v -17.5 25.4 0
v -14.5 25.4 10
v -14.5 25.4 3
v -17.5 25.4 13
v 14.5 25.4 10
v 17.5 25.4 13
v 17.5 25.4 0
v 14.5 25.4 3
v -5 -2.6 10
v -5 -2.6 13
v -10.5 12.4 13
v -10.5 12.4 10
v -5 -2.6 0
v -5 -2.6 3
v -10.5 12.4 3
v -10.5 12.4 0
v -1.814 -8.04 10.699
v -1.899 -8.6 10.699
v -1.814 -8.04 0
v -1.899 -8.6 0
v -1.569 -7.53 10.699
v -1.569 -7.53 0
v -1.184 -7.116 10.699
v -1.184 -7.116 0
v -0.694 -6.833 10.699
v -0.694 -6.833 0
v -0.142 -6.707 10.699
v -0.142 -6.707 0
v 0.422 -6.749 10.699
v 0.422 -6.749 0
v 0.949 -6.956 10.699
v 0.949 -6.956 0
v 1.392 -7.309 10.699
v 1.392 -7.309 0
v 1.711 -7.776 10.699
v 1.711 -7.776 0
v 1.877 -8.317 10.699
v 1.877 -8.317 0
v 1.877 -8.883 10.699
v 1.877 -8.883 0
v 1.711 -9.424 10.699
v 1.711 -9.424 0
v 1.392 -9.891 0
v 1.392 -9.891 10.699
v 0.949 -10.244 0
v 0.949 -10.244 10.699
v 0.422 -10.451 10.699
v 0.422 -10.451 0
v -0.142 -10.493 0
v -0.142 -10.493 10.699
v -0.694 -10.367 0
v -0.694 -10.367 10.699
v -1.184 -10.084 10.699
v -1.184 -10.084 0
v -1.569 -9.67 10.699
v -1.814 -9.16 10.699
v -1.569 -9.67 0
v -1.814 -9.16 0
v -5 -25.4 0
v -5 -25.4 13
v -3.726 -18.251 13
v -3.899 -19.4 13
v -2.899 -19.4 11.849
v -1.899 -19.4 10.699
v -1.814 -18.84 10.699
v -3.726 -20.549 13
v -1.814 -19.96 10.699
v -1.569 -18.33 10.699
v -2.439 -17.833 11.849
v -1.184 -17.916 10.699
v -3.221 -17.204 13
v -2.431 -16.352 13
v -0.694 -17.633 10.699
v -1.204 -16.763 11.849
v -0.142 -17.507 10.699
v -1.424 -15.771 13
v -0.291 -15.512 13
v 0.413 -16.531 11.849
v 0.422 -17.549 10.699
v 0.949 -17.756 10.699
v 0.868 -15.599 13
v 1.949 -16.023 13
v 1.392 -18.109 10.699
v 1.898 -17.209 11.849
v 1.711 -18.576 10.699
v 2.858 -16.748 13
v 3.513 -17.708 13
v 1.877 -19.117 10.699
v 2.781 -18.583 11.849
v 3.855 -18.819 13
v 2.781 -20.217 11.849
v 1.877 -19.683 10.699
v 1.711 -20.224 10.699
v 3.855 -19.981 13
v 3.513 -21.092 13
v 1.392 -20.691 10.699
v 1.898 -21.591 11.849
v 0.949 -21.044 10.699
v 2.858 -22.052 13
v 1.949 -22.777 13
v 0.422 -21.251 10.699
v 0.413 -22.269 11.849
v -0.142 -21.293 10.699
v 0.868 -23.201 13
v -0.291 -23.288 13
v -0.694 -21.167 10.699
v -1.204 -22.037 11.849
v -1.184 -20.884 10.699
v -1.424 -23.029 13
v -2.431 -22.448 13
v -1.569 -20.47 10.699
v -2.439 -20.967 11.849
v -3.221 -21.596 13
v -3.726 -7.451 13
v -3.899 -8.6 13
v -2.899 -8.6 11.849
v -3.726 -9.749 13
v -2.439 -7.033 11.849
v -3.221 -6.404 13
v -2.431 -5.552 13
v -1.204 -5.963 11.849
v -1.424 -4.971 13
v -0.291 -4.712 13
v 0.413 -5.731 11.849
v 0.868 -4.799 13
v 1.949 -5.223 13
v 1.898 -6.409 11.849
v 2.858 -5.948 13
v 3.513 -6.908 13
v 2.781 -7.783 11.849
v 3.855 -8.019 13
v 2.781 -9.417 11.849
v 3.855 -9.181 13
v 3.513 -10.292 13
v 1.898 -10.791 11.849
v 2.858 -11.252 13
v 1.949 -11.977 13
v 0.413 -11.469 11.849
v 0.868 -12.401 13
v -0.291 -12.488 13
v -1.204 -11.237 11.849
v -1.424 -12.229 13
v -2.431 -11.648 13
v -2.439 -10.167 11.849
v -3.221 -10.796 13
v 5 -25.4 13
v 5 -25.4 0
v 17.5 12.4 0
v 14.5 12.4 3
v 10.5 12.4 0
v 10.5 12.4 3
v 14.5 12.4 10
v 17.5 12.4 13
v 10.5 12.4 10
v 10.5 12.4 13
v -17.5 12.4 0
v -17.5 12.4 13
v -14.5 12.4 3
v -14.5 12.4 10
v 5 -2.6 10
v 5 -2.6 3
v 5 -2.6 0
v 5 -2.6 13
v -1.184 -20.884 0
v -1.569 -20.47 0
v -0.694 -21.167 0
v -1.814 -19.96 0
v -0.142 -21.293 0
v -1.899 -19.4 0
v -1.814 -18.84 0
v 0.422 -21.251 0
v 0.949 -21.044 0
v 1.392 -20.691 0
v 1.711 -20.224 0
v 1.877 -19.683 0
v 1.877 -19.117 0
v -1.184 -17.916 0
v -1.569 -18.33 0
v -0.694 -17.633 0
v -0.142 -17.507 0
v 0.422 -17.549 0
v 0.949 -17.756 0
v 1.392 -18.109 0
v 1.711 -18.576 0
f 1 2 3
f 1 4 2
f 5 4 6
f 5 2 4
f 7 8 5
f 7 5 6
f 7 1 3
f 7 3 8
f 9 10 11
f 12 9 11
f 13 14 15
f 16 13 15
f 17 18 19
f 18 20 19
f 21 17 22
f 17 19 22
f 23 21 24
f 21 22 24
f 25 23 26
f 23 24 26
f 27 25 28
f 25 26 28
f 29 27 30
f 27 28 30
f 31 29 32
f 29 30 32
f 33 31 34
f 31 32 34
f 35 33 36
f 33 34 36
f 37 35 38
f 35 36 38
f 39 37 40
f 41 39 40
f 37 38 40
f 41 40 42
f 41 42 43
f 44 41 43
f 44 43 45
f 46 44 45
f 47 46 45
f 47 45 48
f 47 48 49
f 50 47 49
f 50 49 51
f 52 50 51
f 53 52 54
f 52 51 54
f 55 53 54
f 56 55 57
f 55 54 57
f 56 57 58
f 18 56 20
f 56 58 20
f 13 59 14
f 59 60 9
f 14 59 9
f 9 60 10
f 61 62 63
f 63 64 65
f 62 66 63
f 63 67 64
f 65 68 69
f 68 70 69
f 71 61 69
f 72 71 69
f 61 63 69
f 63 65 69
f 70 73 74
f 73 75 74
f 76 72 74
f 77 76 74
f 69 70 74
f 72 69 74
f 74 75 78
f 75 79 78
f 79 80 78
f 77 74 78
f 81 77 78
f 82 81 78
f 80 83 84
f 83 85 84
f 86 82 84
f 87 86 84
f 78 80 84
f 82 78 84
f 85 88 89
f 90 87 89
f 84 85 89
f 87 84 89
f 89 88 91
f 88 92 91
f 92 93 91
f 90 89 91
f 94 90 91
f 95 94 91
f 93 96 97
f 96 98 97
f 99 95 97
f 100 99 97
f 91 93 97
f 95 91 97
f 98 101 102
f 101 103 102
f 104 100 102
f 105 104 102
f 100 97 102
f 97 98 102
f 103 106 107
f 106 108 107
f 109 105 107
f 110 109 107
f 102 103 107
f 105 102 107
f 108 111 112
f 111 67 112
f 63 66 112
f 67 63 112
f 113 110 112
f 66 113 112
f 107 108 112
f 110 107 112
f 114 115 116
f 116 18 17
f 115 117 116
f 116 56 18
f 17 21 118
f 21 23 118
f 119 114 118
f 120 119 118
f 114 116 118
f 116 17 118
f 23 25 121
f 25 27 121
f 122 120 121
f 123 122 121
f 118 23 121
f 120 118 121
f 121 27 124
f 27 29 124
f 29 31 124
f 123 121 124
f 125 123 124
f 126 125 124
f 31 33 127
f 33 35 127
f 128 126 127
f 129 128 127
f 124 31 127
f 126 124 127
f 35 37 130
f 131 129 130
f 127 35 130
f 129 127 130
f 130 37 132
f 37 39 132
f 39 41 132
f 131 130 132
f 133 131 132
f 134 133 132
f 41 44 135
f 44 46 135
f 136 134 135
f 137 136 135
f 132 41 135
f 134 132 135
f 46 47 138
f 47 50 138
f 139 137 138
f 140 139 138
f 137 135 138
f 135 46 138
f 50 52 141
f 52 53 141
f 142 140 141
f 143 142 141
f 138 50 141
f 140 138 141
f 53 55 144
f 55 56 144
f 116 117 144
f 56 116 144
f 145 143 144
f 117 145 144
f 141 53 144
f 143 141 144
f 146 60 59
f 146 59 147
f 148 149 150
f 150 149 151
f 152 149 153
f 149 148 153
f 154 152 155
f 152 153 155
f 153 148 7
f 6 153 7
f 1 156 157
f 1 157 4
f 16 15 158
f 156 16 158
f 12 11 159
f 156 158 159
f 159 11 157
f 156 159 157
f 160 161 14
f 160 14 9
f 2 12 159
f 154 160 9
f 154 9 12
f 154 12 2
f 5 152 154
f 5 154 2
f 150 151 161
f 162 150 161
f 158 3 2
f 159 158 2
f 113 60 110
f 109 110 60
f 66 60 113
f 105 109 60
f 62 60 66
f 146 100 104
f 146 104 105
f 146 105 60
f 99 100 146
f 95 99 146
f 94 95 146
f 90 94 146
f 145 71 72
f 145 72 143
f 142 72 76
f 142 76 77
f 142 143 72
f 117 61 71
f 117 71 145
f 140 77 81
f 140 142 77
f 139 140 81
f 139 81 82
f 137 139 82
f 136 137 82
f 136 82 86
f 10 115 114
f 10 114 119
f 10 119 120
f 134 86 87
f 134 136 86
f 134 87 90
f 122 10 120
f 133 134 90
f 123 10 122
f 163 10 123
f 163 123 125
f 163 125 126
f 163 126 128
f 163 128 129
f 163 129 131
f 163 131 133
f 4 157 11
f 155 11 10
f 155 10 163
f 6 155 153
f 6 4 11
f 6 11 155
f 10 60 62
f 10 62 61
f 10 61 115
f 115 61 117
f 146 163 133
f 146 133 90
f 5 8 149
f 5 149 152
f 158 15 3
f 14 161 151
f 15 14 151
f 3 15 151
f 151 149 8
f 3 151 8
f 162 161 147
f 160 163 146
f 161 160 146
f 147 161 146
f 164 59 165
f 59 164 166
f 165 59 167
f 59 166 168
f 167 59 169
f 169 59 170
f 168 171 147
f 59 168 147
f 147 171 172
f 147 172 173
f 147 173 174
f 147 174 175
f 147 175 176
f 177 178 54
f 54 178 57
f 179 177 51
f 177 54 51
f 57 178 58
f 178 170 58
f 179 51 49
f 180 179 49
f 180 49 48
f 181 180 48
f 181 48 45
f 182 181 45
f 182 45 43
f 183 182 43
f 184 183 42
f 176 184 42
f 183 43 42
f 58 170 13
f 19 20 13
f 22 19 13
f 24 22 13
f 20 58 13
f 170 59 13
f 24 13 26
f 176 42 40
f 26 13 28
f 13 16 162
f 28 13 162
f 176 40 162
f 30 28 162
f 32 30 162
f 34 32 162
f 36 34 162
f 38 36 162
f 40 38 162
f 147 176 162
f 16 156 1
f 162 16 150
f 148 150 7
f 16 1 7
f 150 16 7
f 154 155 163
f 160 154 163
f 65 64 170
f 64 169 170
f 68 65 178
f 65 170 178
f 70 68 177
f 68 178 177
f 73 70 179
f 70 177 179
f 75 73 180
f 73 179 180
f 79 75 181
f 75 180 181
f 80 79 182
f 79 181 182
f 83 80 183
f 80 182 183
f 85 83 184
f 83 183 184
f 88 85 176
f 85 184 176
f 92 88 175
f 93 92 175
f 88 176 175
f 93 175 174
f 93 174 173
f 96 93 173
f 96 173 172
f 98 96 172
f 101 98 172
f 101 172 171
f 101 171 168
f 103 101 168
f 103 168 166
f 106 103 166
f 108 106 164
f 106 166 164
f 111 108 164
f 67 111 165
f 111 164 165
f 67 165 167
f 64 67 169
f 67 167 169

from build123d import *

# Parameters (mm, degrees)
F0_W           = 35
F0_H           = 50.8
F1_DEPTH       = 13
F2_W           = 29
F2_H           = 7
F3_DEPTH       = 28
F4_W           = 15
F4_H           = 7
F5_DEPTH       = 35.001
F7_DEPTH       = 13.001
F9_D           = 3.7973
F9_CSINK_D     = 7.7978
F9_CSINK_ANGLE = 82


with BuildPart() as f1:
    # F0 (on Top) → F1 (new body)
    with BuildSketch(Plane.XY):
        Rectangle(F0_W, F0_H)
    extrude(amount=F1_DEPTH)

    # F2 (on face) → F3 (cut)
    with BuildSketch(Plane(origin=(0, 25.4, 0), x_dir=(-1, 0, 0), z_dir=(0, 1, 0))):
        with Locations((0, 6.5)):
            Rectangle(F2_W, F2_H)
    extrude(amount=-F3_DEPTH, mode=Mode.SUBTRACT)

    # F4 (on face) → F5 (cut, through all)
    with BuildSketch(Plane.YZ.offset(17.5)):
        with Locations((4.9, 6.5)):
            Rectangle(F4_W, F4_H)
    extrude(amount=-F5_DEPTH, mode=Mode.SUBTRACT)

    # F6 (on face) → F7 (cut, through all)
    with BuildSketch(Plane.XY.offset(13)):
        Polygon((-17.5, -25.4), (-5, -25.4), (-5, -2.6), (-10.5, 12.4), (-17.5, 12.4), (-17.5, -2.6), align=None)
        Polygon((17.5, -2.6), (17.5, 12.4), (10.5, 12.4), (5, -2.6), (5, -25.4), (17.5, -25.4), align=None)
    extrude(amount=-F7_DEPTH, mode=Mode.SUBTRACT)

    # F9 (through all)
    with Locations(Plane.XY.offset(13)):
        with Locations((0, -8.6), (0, -19.4)):
            CounterSinkHole(F9_D / 2, F9_CSINK_D / 2, counter_sink_angle=F9_CSINK_ANGLE)


solid = f1.part
